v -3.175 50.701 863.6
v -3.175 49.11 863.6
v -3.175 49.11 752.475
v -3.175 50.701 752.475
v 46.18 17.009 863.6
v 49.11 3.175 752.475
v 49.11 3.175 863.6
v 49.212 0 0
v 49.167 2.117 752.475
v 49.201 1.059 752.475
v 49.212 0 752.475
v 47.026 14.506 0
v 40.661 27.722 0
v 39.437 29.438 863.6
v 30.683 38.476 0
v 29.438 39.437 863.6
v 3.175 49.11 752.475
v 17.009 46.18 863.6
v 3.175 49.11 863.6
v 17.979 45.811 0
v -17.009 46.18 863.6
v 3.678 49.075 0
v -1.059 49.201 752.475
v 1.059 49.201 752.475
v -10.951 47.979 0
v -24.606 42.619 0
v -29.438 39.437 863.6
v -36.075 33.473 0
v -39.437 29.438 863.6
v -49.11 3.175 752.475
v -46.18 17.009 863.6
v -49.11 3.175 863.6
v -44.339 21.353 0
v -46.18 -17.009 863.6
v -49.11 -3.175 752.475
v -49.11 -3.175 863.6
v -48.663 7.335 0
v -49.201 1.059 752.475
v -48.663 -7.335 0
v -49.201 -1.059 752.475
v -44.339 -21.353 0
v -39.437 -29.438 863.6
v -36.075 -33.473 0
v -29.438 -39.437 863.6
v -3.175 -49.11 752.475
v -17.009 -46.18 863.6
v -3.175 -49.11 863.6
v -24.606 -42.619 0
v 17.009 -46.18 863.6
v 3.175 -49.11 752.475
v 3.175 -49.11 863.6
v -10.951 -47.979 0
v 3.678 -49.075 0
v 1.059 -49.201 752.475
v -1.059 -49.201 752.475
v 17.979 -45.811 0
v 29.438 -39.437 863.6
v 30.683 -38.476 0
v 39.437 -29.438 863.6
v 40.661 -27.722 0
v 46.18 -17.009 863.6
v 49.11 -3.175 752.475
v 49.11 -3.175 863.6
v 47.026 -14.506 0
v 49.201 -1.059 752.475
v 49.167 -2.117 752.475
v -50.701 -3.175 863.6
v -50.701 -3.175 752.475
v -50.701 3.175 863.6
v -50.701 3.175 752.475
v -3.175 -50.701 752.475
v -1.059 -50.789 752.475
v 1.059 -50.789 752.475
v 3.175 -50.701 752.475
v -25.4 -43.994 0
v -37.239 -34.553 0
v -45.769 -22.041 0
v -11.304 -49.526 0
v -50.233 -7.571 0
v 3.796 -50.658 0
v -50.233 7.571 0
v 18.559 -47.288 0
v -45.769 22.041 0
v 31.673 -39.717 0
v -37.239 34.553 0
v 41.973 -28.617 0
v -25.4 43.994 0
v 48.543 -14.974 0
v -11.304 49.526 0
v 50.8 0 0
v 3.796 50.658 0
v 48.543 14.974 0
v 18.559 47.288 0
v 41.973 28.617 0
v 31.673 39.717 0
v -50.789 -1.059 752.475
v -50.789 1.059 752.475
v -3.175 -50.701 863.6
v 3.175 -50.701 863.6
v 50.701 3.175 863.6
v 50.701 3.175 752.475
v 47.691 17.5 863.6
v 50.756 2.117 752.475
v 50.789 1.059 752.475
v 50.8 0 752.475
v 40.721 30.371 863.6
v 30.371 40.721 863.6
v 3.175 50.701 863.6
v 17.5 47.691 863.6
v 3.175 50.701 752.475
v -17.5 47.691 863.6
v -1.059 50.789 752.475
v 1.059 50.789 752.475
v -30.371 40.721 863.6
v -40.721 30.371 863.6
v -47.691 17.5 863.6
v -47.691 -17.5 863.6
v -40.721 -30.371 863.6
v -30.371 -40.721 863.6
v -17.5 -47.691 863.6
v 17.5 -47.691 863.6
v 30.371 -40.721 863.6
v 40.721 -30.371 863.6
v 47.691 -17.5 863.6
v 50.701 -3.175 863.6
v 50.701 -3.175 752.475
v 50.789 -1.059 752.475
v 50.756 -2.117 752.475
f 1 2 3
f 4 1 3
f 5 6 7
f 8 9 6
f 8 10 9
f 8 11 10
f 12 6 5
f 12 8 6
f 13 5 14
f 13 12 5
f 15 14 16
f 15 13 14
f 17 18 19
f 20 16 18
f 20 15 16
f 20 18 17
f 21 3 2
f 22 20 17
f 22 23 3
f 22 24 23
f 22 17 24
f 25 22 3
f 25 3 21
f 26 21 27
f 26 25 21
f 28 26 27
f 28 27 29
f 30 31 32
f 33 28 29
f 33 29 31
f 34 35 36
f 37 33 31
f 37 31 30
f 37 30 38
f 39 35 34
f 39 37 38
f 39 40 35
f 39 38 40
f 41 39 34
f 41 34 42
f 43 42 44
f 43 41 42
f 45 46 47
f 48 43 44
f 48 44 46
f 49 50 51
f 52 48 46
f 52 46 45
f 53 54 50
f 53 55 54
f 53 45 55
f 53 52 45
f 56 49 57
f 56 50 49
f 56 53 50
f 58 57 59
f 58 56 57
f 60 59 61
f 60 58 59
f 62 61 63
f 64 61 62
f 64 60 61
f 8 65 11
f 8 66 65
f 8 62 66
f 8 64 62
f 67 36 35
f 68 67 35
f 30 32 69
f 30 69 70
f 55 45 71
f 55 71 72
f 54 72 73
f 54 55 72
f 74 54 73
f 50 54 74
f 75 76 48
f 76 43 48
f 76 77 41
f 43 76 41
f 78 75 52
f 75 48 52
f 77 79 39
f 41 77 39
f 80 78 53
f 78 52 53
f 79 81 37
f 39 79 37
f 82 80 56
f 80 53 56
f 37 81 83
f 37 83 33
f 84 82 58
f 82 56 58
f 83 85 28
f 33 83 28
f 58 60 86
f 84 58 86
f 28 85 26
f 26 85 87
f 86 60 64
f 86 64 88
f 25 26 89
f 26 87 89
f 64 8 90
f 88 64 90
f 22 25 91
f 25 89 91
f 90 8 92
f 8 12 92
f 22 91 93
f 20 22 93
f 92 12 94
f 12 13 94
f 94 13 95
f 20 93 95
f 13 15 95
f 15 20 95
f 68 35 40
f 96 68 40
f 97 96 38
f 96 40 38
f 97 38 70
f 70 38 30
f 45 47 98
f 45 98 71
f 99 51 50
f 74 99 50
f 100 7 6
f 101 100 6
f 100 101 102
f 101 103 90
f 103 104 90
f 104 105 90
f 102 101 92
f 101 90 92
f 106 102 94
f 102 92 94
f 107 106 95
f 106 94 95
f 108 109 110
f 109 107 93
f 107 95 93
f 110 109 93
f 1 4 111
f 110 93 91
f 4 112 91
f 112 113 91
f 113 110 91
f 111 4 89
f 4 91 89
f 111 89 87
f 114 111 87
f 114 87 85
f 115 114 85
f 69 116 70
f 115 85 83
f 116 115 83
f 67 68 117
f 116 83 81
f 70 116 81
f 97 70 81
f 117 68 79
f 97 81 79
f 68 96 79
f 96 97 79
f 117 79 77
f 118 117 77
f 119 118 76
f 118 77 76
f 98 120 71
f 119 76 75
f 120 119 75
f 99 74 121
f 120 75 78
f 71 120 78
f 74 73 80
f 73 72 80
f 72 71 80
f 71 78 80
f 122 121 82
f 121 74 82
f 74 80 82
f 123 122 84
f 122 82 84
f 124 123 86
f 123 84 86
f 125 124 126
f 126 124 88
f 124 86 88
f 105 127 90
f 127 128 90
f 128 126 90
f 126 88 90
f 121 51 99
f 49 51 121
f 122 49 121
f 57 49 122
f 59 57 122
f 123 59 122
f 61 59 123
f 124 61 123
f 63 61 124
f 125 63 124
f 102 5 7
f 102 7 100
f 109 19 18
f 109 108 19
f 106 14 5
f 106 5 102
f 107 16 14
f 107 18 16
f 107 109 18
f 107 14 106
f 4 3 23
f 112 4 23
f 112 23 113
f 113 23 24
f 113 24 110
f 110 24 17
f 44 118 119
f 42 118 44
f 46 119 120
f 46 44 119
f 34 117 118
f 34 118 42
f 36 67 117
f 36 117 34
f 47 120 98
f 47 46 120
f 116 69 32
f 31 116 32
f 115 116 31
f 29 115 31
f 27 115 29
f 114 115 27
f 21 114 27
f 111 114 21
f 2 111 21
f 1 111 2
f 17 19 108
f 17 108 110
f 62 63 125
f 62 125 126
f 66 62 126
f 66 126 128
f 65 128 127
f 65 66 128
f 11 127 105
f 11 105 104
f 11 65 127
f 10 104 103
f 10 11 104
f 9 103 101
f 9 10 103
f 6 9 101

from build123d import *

# Parameters (mm, degrees)
SKETCH1_R               = 50.8
SKETCH1_R_2             = 49.2125
BOSS_EXTRUDE1_DEPTH     = 863.6
SKETCH2_W               = 6.35
SKETCH2_H               = 111.125
CUT_EXTRUDE1_DEPTH      = 51.8
CUT_EXTRUDE1_DEPTH_BACK = 51.8
SKETCH3_W               = 111.125
SKETCH3_H               = 6.35
CUT_EXTRUDE2_DEPTH      = 51.8
CUT_EXTRUDE2_DEPTH_BACK = 51.8


with BuildPart() as part:
    # Sketch1 → Boss-Extrude1 (new body)
    with BuildSketch(Plane.XY):
        Circle(SKETCH1_R)
        Circle(SKETCH1_R_2, mode=Mode.SUBTRACT)
    extrude(amount=BOSS_EXTRUDE1_DEPTH)

    # Sketch2 → Cut-Extrude1 (cut, two sides)
    with BuildSketch(Plane(origin=(0, 0, 0), x_dir=(1, 0, 0), z_dir=(0, 1, 0))) as cut_extrude1_sk:
        with Locations((0, -808.0375)):
            Rectangle(SKETCH2_W, SKETCH2_H)
    extrude(amount=CUT_EXTRUDE1_DEPTH, mode=Mode.SUBTRACT)
    extrude(cut_extrude1_sk.sketch, amount=-CUT_EXTRUDE1_DEPTH_BACK, mode=Mode.SUBTRACT)

    # Sketch3 → Cut-Extrude2 (cut, two sides)
    with BuildSketch(Plane(origin=(0, 0, 0), x_dir=(0, 0, -1), z_dir=(1, 0, 0))) as cut_extrude2_sk:
        with Locations((-808.0375, 0)):
            Rectangle(SKETCH3_W, SKETCH3_H)
    extrude(amount=CUT_EXTRUDE2_DEPTH, mode=Mode.SUBTRACT)
    extrude(cut_extrude2_sk.sketch, amount=-CUT_EXTRUDE2_DEPTH_BACK, mode=Mode.SUBTRACT)


solid = part.part
